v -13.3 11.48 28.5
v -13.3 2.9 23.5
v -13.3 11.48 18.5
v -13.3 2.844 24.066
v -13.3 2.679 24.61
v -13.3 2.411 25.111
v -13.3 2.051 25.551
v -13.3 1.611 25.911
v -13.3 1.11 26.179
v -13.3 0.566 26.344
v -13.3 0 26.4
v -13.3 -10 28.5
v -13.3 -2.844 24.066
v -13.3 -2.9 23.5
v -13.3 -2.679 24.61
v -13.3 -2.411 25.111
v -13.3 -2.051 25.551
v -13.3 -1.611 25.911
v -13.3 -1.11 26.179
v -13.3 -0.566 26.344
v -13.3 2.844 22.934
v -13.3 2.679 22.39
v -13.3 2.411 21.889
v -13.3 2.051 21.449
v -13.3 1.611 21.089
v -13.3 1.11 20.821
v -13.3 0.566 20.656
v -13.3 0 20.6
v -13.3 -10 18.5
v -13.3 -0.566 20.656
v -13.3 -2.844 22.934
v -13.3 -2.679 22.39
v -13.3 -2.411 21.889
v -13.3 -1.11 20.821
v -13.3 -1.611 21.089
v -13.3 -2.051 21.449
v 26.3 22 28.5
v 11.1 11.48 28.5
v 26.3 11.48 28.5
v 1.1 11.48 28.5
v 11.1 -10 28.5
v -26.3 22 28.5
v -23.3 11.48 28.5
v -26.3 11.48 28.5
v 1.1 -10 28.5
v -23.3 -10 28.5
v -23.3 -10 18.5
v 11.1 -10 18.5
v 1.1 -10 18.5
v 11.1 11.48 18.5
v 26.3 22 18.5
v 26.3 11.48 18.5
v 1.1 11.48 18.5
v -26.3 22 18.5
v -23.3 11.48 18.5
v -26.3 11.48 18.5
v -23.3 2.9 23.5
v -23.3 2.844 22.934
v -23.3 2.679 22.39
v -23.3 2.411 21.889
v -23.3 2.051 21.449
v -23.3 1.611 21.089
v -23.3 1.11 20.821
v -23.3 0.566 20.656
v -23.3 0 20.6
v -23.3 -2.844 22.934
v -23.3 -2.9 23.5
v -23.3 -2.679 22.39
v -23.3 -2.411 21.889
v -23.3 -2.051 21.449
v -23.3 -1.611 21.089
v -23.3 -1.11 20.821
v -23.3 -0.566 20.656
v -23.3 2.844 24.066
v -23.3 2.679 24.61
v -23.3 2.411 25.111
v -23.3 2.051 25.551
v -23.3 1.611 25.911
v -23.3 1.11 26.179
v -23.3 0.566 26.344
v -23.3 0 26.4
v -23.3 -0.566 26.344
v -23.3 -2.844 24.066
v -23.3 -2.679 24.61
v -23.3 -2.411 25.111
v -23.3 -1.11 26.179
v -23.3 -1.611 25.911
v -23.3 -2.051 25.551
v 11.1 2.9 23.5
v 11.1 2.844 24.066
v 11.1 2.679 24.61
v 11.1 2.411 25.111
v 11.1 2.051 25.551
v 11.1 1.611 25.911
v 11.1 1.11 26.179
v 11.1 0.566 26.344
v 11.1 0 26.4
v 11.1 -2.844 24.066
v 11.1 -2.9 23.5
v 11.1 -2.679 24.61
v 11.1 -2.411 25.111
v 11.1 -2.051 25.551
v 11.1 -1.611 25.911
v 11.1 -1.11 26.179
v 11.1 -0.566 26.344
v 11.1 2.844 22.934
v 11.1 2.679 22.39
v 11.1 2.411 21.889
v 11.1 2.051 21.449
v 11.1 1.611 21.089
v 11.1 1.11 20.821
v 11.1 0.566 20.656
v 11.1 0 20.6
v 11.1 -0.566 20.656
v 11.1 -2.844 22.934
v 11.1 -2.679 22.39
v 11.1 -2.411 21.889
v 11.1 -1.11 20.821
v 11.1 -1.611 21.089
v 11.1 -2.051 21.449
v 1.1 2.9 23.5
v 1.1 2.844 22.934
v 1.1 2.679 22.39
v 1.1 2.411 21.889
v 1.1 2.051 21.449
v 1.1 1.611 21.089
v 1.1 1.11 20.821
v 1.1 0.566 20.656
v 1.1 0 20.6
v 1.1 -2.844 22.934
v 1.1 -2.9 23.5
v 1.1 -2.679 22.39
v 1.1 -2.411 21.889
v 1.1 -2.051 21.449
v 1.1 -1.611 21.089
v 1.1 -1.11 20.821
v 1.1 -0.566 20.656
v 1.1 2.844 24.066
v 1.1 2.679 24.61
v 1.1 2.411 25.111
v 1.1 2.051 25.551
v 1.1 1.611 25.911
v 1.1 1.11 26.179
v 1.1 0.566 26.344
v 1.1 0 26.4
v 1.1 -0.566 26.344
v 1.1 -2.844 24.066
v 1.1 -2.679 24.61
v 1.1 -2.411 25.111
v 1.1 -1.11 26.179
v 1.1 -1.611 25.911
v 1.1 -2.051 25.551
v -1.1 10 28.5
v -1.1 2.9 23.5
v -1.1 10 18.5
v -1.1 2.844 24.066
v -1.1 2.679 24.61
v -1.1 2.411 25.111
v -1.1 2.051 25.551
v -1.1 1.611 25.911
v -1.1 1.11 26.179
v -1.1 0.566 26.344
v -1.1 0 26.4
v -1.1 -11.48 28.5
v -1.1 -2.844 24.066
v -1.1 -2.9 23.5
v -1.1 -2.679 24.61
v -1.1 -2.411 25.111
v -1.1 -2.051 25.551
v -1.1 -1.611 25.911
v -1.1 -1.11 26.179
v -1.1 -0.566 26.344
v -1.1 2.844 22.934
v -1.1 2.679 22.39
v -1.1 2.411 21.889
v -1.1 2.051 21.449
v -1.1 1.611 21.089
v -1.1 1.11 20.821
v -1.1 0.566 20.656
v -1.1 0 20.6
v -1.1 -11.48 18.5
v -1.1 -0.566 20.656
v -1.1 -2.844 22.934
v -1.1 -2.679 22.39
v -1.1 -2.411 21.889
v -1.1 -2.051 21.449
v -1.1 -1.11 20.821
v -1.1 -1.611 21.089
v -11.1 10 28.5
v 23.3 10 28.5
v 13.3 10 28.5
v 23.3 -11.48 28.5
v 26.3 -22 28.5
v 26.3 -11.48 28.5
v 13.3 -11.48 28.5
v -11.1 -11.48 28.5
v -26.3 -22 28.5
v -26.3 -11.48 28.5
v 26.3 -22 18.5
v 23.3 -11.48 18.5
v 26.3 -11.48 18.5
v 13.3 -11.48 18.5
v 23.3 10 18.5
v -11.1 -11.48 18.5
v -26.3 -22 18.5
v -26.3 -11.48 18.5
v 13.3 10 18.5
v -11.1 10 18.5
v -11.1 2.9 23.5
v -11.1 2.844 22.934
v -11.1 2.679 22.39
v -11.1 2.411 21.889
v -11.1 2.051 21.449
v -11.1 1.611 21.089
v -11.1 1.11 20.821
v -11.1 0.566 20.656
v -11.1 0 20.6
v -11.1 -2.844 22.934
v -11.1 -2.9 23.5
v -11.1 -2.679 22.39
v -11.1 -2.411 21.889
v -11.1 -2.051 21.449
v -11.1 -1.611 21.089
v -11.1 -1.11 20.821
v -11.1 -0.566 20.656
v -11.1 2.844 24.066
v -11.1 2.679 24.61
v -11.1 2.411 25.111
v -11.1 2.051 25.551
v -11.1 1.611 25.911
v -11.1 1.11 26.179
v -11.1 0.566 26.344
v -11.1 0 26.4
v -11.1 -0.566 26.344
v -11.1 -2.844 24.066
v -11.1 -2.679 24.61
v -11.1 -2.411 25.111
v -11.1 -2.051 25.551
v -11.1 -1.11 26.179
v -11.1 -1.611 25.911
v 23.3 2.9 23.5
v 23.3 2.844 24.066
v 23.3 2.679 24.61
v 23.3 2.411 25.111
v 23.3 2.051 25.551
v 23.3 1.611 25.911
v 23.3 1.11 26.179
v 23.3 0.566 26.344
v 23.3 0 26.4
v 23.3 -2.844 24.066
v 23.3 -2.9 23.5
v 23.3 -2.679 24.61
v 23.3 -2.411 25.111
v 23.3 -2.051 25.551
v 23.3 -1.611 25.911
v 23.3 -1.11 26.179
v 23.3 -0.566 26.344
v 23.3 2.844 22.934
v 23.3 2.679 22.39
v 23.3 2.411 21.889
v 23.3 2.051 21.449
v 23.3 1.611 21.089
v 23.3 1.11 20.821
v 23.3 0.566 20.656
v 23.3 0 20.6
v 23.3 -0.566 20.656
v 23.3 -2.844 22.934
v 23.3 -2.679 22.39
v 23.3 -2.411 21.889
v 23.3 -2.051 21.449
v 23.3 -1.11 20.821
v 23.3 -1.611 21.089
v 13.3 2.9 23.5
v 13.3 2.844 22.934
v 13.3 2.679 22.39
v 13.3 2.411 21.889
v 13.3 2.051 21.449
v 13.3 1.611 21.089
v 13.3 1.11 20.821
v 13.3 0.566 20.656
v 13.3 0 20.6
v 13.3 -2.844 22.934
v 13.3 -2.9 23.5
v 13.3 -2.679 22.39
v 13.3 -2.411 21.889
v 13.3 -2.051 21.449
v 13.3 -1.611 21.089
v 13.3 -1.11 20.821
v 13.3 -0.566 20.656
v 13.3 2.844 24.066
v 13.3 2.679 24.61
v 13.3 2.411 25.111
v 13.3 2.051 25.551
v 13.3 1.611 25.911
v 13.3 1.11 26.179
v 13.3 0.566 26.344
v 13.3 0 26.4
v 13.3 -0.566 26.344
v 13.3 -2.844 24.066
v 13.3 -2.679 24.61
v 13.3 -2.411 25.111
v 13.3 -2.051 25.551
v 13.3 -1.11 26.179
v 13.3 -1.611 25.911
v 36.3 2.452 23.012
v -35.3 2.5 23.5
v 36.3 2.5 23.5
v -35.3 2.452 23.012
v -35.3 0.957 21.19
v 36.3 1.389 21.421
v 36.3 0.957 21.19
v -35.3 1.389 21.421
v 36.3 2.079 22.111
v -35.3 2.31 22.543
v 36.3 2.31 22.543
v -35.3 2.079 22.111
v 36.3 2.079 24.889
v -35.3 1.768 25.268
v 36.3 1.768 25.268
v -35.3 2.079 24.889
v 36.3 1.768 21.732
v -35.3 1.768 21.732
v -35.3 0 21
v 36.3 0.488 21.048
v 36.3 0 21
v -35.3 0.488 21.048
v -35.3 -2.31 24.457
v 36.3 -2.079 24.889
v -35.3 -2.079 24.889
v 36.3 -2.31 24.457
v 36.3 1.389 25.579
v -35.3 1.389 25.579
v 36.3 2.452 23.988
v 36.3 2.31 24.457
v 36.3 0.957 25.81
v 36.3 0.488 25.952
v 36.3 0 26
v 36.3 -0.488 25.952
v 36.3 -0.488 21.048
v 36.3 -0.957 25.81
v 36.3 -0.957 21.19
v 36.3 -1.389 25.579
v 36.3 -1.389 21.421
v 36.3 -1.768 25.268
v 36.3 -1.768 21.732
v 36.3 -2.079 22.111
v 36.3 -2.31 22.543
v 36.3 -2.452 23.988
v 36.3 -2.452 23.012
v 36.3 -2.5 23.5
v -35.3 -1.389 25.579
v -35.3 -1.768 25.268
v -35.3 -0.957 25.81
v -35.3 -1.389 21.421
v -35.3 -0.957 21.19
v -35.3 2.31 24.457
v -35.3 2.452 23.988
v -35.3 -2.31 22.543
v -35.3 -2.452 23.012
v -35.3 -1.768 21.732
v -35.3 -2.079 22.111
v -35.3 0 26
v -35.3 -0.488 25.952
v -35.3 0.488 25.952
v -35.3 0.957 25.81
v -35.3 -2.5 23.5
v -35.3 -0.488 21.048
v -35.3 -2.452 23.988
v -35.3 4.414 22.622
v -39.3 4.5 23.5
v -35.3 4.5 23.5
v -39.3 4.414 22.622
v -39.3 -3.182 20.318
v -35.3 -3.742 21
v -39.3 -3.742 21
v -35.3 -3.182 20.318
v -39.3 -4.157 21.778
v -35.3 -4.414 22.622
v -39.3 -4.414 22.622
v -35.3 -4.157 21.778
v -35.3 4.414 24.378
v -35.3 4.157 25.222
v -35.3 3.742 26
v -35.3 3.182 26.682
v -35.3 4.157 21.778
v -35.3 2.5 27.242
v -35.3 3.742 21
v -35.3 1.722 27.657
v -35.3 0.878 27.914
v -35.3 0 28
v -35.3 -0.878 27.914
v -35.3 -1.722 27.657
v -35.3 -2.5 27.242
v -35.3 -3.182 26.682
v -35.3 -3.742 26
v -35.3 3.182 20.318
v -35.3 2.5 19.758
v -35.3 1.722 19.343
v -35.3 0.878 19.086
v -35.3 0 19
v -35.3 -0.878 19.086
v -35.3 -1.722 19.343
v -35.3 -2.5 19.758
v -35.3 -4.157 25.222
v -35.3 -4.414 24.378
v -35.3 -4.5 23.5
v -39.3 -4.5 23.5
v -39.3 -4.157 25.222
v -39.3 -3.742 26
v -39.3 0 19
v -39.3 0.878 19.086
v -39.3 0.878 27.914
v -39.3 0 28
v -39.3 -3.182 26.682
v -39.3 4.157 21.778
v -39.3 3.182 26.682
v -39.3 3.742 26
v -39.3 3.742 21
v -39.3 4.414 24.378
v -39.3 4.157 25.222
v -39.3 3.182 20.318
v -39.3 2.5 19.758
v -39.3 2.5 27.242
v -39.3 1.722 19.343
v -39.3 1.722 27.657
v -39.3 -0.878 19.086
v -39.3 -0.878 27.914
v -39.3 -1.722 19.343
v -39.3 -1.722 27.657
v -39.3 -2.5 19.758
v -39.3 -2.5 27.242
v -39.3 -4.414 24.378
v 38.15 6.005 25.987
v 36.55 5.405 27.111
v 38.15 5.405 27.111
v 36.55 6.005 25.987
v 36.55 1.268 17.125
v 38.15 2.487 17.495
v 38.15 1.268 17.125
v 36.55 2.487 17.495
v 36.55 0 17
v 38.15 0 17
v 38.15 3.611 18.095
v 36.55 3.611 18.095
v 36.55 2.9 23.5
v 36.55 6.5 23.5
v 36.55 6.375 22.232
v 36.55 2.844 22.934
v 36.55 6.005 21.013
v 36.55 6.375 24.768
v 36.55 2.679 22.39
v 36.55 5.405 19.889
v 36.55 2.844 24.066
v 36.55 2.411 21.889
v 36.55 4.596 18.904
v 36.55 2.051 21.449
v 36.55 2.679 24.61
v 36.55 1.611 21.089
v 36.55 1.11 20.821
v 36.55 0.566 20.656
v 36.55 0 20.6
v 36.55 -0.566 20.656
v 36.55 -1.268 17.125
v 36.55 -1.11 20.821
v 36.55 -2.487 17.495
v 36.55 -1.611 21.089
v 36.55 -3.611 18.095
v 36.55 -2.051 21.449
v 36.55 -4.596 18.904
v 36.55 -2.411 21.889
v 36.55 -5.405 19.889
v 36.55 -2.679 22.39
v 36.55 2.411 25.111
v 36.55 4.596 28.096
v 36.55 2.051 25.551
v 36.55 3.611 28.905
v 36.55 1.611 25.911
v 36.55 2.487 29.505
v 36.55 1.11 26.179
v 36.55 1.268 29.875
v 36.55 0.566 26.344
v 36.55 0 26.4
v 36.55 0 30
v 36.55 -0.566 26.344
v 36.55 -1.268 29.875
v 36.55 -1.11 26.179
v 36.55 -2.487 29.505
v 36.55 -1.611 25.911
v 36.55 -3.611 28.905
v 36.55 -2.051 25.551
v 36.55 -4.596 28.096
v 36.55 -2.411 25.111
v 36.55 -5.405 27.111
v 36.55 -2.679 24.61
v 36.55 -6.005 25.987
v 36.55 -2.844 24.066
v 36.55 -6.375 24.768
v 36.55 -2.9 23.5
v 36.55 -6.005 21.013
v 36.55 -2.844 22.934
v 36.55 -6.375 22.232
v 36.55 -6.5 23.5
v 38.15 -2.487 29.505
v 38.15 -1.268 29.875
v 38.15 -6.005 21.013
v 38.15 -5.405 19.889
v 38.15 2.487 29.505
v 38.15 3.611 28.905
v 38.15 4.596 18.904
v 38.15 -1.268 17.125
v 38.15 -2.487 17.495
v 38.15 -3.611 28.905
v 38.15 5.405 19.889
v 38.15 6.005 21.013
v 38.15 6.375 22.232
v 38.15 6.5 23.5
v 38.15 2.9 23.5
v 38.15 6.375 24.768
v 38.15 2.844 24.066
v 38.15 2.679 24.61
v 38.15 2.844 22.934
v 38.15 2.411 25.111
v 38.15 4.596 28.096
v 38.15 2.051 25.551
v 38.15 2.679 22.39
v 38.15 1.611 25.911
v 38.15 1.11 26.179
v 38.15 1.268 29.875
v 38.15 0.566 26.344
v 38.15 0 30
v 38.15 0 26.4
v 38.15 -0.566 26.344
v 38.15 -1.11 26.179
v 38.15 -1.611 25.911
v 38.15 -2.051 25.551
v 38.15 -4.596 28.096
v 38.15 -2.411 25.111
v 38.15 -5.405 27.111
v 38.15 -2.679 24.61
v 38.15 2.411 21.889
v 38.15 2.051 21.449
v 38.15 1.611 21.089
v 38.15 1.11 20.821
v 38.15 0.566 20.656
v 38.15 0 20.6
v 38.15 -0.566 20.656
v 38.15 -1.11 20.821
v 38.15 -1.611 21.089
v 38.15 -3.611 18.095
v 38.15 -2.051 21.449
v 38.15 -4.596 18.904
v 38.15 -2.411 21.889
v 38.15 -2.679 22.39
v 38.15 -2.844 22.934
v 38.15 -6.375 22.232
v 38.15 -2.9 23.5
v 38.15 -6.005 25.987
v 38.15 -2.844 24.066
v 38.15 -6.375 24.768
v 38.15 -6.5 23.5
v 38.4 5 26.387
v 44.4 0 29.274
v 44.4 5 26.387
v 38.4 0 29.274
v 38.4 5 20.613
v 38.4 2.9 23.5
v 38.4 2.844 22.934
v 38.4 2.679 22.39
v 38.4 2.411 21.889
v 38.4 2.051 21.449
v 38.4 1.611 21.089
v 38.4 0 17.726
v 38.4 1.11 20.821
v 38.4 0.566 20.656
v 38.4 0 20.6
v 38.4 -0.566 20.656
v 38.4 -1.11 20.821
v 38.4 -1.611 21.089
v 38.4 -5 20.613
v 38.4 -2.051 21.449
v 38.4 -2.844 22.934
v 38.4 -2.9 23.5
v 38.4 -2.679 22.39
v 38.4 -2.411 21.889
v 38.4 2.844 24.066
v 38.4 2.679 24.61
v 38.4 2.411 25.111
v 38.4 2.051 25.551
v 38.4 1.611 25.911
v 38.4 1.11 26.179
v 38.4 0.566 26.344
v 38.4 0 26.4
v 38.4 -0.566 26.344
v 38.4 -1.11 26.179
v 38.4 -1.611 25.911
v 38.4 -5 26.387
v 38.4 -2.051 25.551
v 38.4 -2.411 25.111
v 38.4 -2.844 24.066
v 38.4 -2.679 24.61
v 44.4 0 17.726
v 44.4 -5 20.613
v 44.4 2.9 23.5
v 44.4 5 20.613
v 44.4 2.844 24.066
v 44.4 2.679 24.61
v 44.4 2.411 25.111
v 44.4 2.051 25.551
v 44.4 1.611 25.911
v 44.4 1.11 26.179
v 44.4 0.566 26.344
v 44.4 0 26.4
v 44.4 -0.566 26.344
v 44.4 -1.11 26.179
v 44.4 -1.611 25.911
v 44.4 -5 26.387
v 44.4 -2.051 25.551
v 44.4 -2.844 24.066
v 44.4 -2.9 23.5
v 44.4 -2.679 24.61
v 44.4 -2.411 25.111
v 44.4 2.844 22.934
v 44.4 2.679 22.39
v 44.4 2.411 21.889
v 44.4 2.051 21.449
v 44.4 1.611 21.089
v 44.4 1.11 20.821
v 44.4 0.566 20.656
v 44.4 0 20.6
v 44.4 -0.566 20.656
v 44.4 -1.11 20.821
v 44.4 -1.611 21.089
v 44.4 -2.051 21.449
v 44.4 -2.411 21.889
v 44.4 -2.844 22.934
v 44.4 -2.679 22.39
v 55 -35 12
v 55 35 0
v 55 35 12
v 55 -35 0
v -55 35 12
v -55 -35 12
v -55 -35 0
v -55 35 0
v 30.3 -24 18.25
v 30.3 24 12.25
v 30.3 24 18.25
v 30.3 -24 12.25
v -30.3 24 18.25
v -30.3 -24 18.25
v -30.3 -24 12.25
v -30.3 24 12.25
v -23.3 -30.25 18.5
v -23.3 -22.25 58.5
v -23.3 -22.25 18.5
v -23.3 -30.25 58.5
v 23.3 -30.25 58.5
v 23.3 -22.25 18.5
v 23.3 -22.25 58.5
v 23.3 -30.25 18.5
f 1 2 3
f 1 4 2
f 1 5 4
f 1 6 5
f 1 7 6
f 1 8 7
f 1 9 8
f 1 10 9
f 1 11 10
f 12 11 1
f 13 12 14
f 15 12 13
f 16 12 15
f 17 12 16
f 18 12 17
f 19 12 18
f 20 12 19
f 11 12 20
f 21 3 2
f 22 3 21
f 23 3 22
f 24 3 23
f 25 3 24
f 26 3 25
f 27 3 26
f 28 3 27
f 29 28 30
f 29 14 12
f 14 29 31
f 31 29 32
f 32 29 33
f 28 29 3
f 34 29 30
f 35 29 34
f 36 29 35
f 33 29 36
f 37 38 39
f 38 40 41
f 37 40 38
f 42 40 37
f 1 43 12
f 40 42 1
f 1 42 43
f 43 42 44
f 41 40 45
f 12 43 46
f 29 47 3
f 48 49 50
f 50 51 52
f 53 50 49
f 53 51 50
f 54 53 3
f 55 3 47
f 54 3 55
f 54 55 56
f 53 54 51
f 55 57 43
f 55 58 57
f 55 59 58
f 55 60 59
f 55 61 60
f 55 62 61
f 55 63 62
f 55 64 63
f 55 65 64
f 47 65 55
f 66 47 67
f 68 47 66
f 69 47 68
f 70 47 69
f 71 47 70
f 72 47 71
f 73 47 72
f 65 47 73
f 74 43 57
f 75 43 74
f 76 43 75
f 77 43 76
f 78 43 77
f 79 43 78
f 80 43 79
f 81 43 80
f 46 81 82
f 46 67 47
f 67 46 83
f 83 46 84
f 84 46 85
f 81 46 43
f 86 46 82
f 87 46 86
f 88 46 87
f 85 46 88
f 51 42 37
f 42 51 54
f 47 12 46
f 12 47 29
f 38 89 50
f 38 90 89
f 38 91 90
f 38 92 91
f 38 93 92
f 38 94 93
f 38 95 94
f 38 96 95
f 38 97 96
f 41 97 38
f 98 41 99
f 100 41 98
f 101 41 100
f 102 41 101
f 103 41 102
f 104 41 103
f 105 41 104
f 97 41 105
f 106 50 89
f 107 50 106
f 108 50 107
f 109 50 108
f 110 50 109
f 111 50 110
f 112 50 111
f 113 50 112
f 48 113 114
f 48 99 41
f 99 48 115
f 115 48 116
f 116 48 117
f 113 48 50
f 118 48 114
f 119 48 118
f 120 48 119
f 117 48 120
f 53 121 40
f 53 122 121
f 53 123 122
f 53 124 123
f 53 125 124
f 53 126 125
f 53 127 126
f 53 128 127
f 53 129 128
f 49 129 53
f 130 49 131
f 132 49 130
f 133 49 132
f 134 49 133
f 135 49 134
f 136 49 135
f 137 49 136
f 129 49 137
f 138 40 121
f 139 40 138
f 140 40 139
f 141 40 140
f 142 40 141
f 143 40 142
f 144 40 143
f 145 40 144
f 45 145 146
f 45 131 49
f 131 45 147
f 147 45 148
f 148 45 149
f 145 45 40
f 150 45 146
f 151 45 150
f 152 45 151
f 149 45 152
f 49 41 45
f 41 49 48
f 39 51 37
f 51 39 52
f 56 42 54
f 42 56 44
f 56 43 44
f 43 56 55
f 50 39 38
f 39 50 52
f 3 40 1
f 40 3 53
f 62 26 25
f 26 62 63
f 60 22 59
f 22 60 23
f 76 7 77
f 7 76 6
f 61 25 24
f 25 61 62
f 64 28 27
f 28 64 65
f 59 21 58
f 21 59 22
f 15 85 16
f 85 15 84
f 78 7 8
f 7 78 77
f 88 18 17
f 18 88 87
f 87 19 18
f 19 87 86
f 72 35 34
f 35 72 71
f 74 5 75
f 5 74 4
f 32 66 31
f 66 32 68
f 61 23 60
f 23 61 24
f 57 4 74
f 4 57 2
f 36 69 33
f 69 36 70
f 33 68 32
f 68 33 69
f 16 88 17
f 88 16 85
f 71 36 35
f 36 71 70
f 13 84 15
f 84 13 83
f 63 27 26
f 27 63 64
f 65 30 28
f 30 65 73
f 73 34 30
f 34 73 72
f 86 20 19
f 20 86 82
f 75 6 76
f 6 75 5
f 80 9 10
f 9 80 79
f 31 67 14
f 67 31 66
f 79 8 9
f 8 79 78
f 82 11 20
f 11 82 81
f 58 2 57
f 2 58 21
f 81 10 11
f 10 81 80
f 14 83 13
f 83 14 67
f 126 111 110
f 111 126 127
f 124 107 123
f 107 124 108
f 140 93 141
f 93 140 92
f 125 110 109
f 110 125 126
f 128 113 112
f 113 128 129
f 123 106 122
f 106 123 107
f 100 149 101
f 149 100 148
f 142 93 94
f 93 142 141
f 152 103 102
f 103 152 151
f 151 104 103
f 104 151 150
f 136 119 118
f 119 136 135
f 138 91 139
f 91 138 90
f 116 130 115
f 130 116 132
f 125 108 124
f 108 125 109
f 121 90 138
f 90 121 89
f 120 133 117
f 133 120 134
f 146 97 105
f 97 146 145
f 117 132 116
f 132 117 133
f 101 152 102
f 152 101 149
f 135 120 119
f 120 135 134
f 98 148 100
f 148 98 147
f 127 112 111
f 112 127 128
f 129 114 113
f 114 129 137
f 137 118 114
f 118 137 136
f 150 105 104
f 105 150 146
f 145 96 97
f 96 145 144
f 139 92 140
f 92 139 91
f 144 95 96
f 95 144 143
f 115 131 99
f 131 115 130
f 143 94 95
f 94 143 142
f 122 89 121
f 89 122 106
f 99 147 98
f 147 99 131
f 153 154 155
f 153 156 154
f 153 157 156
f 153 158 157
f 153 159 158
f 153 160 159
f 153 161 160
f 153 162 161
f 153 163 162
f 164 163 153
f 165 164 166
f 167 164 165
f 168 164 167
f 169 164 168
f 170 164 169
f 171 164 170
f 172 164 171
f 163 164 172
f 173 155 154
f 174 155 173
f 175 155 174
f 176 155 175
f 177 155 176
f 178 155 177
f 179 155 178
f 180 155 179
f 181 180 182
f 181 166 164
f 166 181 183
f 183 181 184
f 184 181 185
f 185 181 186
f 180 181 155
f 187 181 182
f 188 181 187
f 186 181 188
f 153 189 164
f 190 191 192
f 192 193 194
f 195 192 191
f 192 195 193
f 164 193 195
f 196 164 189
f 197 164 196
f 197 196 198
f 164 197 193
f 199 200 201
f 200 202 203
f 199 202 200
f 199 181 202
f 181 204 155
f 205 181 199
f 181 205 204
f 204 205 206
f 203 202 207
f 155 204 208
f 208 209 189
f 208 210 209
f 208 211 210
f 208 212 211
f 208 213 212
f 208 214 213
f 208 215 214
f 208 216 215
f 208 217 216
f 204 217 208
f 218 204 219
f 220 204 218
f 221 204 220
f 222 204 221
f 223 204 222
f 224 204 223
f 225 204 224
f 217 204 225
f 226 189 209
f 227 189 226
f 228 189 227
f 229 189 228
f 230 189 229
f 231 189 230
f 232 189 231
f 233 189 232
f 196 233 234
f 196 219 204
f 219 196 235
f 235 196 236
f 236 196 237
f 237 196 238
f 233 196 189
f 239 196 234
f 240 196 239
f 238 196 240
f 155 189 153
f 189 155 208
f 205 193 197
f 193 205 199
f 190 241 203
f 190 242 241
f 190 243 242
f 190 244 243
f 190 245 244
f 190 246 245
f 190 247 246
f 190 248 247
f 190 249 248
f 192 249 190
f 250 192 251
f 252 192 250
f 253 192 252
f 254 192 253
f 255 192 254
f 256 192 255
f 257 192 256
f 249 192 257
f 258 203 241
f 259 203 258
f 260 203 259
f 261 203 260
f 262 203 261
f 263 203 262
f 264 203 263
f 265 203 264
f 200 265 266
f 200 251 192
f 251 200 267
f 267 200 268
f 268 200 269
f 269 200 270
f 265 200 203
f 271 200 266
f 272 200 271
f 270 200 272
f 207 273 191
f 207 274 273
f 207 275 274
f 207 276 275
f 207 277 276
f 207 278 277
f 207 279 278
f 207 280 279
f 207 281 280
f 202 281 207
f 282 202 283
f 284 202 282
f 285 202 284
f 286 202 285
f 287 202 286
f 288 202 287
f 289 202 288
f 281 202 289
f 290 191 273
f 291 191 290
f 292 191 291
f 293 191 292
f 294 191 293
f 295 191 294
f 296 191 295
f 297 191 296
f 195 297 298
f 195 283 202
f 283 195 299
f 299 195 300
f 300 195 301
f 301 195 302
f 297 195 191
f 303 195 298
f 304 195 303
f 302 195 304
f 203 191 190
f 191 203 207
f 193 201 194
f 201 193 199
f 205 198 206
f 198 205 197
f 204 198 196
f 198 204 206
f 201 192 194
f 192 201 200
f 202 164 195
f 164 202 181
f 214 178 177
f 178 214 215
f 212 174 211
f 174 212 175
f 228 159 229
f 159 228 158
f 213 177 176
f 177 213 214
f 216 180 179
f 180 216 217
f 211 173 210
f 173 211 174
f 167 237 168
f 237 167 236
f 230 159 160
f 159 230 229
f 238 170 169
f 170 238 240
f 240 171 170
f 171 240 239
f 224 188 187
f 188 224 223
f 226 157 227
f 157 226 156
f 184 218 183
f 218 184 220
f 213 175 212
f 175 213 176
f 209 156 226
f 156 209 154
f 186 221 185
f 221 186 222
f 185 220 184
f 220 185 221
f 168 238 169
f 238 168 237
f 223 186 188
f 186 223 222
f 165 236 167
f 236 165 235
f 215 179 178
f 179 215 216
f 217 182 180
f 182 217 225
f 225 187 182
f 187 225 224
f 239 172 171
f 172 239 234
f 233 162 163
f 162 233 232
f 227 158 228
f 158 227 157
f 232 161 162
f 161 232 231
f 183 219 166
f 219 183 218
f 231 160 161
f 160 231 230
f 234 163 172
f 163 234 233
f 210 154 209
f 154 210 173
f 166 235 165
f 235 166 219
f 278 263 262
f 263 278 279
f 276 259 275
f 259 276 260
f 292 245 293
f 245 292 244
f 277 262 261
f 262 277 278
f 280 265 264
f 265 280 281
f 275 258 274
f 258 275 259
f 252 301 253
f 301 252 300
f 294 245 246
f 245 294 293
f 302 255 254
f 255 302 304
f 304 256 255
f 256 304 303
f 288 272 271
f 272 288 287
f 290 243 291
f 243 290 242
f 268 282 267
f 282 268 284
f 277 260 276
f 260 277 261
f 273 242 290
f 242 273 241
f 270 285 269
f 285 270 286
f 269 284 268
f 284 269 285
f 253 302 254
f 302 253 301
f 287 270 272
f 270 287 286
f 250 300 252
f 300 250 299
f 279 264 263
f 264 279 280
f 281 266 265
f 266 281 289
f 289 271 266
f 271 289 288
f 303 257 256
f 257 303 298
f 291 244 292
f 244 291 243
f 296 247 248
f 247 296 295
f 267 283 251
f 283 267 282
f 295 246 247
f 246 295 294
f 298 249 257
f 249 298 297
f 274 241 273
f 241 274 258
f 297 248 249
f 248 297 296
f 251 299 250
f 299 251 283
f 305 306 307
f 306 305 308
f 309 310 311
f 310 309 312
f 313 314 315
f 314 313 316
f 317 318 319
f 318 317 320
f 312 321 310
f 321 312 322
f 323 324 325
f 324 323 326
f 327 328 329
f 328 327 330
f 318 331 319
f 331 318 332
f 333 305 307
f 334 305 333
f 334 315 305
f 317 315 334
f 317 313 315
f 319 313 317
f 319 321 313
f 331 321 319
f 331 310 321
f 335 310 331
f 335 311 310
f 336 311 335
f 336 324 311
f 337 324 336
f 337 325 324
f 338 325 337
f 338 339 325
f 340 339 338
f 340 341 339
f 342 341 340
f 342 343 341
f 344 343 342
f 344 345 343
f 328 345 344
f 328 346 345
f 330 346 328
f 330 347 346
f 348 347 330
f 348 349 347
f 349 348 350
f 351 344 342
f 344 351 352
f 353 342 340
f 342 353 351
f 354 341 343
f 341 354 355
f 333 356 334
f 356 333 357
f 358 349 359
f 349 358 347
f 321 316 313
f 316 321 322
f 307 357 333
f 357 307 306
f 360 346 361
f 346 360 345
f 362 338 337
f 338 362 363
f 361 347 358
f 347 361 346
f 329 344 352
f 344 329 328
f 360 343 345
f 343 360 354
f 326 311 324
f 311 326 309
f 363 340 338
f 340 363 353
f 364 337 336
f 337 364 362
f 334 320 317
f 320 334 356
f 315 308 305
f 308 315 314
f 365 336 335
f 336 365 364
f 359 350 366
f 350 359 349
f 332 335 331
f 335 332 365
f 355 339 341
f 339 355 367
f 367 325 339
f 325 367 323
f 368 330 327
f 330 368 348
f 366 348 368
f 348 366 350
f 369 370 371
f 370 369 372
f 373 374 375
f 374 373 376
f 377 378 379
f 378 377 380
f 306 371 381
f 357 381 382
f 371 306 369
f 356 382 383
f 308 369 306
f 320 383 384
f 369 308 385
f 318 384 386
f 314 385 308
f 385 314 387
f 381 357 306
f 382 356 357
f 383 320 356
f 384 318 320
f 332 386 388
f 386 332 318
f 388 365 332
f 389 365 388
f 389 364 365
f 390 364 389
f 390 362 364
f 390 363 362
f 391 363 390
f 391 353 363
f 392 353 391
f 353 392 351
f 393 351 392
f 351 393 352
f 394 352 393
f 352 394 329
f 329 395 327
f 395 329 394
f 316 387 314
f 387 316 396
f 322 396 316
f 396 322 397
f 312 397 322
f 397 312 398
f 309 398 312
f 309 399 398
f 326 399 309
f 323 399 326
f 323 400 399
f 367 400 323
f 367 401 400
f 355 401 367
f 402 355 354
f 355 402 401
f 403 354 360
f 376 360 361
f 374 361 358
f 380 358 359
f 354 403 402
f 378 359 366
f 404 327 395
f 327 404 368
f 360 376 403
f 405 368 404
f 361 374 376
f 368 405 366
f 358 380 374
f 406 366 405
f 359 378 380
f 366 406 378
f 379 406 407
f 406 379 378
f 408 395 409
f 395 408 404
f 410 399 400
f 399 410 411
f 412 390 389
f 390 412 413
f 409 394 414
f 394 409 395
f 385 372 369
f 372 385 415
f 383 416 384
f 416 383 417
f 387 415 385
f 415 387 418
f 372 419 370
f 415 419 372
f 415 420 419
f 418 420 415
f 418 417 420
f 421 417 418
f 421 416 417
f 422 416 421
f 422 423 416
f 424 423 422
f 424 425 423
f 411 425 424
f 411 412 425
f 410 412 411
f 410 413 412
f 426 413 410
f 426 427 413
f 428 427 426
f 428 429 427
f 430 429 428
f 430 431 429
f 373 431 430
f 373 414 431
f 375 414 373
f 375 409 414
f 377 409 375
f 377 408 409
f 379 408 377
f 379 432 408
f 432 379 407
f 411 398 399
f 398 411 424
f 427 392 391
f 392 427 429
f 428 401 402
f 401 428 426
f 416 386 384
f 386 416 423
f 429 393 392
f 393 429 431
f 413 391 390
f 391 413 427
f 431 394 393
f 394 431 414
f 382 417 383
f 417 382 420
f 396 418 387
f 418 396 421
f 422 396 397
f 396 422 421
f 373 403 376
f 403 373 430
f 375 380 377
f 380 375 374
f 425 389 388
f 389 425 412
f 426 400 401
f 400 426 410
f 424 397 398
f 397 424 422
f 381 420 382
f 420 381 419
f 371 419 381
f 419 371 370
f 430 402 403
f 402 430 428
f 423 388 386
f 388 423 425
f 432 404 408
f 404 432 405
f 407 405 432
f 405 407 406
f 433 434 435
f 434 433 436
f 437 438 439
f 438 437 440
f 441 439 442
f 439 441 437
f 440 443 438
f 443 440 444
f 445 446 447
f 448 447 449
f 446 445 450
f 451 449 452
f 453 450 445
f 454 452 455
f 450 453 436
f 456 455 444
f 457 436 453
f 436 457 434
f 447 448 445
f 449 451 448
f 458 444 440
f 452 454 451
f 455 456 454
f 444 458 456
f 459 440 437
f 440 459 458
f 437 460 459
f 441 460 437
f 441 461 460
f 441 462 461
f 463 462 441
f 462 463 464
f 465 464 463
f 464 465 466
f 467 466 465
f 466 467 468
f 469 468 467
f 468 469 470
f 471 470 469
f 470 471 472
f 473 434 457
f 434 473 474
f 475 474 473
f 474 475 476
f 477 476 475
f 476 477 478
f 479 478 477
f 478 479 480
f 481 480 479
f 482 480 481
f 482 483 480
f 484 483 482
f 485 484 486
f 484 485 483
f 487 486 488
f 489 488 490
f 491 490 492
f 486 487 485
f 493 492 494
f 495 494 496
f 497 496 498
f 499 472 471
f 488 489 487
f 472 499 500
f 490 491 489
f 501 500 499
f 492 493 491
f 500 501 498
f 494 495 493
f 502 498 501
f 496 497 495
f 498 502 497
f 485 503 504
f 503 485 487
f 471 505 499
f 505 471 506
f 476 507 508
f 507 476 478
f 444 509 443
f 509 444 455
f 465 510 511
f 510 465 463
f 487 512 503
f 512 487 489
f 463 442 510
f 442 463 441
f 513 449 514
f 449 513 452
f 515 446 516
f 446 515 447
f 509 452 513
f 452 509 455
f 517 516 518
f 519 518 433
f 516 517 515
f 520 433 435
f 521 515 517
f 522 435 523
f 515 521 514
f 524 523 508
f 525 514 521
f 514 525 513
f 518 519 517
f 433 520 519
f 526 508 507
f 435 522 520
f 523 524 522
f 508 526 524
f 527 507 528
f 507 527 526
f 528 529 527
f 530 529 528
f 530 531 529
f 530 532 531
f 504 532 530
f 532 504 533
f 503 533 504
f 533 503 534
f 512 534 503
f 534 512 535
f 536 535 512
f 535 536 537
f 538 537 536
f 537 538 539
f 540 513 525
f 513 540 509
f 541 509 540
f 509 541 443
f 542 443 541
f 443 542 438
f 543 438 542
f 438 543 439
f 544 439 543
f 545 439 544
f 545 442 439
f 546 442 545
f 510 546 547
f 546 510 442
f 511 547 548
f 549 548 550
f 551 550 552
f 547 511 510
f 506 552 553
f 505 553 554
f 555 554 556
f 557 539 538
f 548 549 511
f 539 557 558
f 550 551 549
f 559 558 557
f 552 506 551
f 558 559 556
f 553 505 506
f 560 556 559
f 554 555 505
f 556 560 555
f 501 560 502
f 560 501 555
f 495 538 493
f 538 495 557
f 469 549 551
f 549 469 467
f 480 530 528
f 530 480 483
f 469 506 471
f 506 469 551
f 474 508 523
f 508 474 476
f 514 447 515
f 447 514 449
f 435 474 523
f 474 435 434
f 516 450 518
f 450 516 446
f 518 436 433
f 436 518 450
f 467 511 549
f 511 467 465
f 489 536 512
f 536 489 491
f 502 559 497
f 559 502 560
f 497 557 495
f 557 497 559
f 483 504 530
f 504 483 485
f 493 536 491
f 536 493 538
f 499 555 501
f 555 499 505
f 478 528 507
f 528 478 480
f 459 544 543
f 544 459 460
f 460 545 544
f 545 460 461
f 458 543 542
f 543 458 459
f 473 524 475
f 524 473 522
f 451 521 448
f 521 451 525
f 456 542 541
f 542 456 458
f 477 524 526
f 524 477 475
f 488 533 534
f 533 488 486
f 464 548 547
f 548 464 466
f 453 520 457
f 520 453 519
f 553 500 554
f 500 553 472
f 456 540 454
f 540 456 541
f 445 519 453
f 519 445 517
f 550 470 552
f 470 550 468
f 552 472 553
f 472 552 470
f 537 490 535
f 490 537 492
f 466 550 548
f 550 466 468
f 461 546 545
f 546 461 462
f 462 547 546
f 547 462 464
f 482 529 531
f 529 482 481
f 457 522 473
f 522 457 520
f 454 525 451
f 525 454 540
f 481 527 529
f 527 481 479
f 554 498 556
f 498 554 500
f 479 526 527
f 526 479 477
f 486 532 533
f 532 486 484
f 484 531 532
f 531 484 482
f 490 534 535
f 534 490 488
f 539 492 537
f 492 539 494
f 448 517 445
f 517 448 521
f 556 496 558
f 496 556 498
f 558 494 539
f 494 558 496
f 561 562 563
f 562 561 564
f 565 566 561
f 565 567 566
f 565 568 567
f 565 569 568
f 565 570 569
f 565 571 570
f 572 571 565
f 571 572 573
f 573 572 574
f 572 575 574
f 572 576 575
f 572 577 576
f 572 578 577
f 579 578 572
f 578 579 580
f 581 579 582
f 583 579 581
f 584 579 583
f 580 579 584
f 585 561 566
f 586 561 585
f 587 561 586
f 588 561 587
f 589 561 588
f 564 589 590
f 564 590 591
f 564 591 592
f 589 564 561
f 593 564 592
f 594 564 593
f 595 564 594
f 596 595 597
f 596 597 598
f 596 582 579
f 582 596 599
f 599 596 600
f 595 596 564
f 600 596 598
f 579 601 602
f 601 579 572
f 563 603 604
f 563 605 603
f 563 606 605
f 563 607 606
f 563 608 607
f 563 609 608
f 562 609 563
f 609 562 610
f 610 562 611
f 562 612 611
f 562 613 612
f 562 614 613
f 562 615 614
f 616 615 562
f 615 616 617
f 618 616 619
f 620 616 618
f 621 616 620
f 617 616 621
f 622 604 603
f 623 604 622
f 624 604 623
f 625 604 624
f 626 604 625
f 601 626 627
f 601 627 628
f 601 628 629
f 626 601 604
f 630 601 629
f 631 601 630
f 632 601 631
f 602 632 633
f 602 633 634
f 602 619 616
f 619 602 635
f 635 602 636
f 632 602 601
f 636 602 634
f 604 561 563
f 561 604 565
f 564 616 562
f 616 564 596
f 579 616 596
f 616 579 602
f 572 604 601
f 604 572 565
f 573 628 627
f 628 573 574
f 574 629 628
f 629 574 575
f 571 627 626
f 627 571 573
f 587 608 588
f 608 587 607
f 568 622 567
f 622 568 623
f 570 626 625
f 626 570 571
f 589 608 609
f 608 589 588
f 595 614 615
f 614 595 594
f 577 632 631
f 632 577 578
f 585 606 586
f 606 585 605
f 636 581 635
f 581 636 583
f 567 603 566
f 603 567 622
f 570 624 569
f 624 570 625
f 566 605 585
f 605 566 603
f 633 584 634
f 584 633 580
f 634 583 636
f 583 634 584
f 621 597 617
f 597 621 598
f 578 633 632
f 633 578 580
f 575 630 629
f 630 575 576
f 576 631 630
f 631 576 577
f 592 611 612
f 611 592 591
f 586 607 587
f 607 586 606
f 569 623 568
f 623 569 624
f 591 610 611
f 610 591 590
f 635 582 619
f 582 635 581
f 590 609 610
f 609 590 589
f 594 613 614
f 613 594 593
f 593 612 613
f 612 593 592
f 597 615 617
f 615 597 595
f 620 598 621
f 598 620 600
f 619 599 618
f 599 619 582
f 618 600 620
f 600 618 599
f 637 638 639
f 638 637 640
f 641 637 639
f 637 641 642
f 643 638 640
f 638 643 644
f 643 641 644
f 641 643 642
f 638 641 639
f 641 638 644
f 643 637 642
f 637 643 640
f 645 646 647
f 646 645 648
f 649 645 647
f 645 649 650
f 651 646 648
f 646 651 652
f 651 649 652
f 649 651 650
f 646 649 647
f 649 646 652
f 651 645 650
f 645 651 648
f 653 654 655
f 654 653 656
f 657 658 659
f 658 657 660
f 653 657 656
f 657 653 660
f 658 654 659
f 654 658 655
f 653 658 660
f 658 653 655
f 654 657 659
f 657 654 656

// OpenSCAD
$fn = 32;

// ------------------------------------------------------------------------
// Comb hinge with flap: leaf 52.6 x 22 mm, pin d5, flap 40 mm
// Every part is its own module, assembly() places every instance.
// ------------------------------------------------------------------------

// --- part 1 ---
module hinge_bed() {
  difference() {
    translate([-55, -35, 0]) cube([110, 70, 12]);
  }
}

// --- part 2 ---
module hinge_riser() {
  difference() {
    translate([-30.3, -24, 0]) cube([60.6, 48, 6]);
  }
}

// --- part 3 ---
module hinge_leaf_a() {
  difference() {
    union() {
      translate([-23.3, -10, -5]) cube([10, 32, 10]);
      translate([1.1, -10, -5]) cube([10, 32, 10]);
      translate([-26.3, 11.48, -5]) cube([52.6, 10.52, 10]);
    }
    translate([-18.3, 0, 0]) rotate([0, 90, 0]) cylinder(h = 12, d = 5.8, center = true);
    translate([6.1, 0, 0]) rotate([0, 90, 0]) cylinder(h = 12, d = 5.8, center = true);
  }
}

// --- part 4 ---
module hinge_leaf_b() {
  difference() {
    union() {
      translate([-11.1, -22, -5]) cube([10, 32, 10]);
      translate([13.3, -22, -5]) cube([10, 32, 10]);
      translate([-26.3, -22, -5]) cube([52.6, 10.52, 10]);
    }
    translate([-6.1, 0, 0]) rotate([0, 90, 0]) cylinder(h = 12, d = 5.8, center = true);
    translate([18.3, 0, 0]) rotate([0, 90, 0]) cylinder(h = 12, d = 5.8, center = true);
  }
}

// --- part 5 ---
module hinge_flap() {
  difference() {
    translate([-23.3, -20, 0]) cube([46.6, 40, 8]);
  }
}

// --- part 6 ---
module hinge_pin() {
  rotate([0, 90, 0]) cylinder(h = 72.6, d = 5, center = true);
  translate([-39.3, 0, 0]) rotate([0, 90, 0]) cylinder(h = 4, d = 9);
}

// --- part 7 ---
module pin_washer() {
  difference() {
      translate([0, 0, 0]) cylinder(h = 1.6, d = 13);
      translate([0, 0, -1]) cylinder(h = 3.6, d = 5.8);
    }
}

// --- part 8 ---
module pin_nut() {
  difference() {
    linear_extrude(height = 6) polygon(points = [[5.774, 0], [2.887, 5], [-2.887, 5], [-5.774, 0], [-2.887, -5], [2.887, -5]]);
    translate([0, 0, -1]) cylinder(h = 8, d = 5.8);
  }
}

// --- assembly ---
module assembly() {
  color([0.80, 0.24, 0.20]) translate([0, 0, 0]) rotate([0, 0, 0]) hinge_bed();
  color([0.20, 0.45, 0.75]) translate([0, 0, 12.25]) rotate([0, 0, 0]) hinge_riser();
  color([0.25, 0.62, 0.32]) translate([0, 0, 23.5]) rotate([0, 0, 0]) hinge_leaf_a();
  color([0.92, 0.70, 0.18]) translate([0, 0, 23.5]) rotate([0, 0, 0]) hinge_leaf_b();
  color([0.58, 0.35, 0.70]) translate([0, -22.25, 38.5]) rotate([90, 0, 0]) hinge_flap();
  color([0.16, 0.66, 0.66]) translate([0, 0, 23.5]) rotate([0, 0, 0]) hinge_pin();
  color([0.85, 0.48, 0.18]) translate([36.55, 0, 23.5]) rotate([0, 90, 0]) pin_washer();
  color([0.55, 0.60, 0.65]) translate([38.4, 0, 23.5]) rotate([0, 90, 0]) pin_nut();
}

assembly();
